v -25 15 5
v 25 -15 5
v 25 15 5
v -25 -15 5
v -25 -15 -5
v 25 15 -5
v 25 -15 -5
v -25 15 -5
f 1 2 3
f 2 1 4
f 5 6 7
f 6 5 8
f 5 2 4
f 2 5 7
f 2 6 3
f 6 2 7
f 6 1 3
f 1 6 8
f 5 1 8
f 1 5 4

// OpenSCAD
// Parameters
body_length = 50; //[25:100:1]
body_width = 30; //[15:60:1]
body_height = 10; //[5:20:1]

// Main Body Module
module main_body() {
  color([0.85, 0.85, 0.8]) // Off-white for 3D printed PLA
  translate([0, 0, 0])
    cube([body_length, body_width, body_height], center=true);
}

// Final Model
union() {
  main_body();
}
